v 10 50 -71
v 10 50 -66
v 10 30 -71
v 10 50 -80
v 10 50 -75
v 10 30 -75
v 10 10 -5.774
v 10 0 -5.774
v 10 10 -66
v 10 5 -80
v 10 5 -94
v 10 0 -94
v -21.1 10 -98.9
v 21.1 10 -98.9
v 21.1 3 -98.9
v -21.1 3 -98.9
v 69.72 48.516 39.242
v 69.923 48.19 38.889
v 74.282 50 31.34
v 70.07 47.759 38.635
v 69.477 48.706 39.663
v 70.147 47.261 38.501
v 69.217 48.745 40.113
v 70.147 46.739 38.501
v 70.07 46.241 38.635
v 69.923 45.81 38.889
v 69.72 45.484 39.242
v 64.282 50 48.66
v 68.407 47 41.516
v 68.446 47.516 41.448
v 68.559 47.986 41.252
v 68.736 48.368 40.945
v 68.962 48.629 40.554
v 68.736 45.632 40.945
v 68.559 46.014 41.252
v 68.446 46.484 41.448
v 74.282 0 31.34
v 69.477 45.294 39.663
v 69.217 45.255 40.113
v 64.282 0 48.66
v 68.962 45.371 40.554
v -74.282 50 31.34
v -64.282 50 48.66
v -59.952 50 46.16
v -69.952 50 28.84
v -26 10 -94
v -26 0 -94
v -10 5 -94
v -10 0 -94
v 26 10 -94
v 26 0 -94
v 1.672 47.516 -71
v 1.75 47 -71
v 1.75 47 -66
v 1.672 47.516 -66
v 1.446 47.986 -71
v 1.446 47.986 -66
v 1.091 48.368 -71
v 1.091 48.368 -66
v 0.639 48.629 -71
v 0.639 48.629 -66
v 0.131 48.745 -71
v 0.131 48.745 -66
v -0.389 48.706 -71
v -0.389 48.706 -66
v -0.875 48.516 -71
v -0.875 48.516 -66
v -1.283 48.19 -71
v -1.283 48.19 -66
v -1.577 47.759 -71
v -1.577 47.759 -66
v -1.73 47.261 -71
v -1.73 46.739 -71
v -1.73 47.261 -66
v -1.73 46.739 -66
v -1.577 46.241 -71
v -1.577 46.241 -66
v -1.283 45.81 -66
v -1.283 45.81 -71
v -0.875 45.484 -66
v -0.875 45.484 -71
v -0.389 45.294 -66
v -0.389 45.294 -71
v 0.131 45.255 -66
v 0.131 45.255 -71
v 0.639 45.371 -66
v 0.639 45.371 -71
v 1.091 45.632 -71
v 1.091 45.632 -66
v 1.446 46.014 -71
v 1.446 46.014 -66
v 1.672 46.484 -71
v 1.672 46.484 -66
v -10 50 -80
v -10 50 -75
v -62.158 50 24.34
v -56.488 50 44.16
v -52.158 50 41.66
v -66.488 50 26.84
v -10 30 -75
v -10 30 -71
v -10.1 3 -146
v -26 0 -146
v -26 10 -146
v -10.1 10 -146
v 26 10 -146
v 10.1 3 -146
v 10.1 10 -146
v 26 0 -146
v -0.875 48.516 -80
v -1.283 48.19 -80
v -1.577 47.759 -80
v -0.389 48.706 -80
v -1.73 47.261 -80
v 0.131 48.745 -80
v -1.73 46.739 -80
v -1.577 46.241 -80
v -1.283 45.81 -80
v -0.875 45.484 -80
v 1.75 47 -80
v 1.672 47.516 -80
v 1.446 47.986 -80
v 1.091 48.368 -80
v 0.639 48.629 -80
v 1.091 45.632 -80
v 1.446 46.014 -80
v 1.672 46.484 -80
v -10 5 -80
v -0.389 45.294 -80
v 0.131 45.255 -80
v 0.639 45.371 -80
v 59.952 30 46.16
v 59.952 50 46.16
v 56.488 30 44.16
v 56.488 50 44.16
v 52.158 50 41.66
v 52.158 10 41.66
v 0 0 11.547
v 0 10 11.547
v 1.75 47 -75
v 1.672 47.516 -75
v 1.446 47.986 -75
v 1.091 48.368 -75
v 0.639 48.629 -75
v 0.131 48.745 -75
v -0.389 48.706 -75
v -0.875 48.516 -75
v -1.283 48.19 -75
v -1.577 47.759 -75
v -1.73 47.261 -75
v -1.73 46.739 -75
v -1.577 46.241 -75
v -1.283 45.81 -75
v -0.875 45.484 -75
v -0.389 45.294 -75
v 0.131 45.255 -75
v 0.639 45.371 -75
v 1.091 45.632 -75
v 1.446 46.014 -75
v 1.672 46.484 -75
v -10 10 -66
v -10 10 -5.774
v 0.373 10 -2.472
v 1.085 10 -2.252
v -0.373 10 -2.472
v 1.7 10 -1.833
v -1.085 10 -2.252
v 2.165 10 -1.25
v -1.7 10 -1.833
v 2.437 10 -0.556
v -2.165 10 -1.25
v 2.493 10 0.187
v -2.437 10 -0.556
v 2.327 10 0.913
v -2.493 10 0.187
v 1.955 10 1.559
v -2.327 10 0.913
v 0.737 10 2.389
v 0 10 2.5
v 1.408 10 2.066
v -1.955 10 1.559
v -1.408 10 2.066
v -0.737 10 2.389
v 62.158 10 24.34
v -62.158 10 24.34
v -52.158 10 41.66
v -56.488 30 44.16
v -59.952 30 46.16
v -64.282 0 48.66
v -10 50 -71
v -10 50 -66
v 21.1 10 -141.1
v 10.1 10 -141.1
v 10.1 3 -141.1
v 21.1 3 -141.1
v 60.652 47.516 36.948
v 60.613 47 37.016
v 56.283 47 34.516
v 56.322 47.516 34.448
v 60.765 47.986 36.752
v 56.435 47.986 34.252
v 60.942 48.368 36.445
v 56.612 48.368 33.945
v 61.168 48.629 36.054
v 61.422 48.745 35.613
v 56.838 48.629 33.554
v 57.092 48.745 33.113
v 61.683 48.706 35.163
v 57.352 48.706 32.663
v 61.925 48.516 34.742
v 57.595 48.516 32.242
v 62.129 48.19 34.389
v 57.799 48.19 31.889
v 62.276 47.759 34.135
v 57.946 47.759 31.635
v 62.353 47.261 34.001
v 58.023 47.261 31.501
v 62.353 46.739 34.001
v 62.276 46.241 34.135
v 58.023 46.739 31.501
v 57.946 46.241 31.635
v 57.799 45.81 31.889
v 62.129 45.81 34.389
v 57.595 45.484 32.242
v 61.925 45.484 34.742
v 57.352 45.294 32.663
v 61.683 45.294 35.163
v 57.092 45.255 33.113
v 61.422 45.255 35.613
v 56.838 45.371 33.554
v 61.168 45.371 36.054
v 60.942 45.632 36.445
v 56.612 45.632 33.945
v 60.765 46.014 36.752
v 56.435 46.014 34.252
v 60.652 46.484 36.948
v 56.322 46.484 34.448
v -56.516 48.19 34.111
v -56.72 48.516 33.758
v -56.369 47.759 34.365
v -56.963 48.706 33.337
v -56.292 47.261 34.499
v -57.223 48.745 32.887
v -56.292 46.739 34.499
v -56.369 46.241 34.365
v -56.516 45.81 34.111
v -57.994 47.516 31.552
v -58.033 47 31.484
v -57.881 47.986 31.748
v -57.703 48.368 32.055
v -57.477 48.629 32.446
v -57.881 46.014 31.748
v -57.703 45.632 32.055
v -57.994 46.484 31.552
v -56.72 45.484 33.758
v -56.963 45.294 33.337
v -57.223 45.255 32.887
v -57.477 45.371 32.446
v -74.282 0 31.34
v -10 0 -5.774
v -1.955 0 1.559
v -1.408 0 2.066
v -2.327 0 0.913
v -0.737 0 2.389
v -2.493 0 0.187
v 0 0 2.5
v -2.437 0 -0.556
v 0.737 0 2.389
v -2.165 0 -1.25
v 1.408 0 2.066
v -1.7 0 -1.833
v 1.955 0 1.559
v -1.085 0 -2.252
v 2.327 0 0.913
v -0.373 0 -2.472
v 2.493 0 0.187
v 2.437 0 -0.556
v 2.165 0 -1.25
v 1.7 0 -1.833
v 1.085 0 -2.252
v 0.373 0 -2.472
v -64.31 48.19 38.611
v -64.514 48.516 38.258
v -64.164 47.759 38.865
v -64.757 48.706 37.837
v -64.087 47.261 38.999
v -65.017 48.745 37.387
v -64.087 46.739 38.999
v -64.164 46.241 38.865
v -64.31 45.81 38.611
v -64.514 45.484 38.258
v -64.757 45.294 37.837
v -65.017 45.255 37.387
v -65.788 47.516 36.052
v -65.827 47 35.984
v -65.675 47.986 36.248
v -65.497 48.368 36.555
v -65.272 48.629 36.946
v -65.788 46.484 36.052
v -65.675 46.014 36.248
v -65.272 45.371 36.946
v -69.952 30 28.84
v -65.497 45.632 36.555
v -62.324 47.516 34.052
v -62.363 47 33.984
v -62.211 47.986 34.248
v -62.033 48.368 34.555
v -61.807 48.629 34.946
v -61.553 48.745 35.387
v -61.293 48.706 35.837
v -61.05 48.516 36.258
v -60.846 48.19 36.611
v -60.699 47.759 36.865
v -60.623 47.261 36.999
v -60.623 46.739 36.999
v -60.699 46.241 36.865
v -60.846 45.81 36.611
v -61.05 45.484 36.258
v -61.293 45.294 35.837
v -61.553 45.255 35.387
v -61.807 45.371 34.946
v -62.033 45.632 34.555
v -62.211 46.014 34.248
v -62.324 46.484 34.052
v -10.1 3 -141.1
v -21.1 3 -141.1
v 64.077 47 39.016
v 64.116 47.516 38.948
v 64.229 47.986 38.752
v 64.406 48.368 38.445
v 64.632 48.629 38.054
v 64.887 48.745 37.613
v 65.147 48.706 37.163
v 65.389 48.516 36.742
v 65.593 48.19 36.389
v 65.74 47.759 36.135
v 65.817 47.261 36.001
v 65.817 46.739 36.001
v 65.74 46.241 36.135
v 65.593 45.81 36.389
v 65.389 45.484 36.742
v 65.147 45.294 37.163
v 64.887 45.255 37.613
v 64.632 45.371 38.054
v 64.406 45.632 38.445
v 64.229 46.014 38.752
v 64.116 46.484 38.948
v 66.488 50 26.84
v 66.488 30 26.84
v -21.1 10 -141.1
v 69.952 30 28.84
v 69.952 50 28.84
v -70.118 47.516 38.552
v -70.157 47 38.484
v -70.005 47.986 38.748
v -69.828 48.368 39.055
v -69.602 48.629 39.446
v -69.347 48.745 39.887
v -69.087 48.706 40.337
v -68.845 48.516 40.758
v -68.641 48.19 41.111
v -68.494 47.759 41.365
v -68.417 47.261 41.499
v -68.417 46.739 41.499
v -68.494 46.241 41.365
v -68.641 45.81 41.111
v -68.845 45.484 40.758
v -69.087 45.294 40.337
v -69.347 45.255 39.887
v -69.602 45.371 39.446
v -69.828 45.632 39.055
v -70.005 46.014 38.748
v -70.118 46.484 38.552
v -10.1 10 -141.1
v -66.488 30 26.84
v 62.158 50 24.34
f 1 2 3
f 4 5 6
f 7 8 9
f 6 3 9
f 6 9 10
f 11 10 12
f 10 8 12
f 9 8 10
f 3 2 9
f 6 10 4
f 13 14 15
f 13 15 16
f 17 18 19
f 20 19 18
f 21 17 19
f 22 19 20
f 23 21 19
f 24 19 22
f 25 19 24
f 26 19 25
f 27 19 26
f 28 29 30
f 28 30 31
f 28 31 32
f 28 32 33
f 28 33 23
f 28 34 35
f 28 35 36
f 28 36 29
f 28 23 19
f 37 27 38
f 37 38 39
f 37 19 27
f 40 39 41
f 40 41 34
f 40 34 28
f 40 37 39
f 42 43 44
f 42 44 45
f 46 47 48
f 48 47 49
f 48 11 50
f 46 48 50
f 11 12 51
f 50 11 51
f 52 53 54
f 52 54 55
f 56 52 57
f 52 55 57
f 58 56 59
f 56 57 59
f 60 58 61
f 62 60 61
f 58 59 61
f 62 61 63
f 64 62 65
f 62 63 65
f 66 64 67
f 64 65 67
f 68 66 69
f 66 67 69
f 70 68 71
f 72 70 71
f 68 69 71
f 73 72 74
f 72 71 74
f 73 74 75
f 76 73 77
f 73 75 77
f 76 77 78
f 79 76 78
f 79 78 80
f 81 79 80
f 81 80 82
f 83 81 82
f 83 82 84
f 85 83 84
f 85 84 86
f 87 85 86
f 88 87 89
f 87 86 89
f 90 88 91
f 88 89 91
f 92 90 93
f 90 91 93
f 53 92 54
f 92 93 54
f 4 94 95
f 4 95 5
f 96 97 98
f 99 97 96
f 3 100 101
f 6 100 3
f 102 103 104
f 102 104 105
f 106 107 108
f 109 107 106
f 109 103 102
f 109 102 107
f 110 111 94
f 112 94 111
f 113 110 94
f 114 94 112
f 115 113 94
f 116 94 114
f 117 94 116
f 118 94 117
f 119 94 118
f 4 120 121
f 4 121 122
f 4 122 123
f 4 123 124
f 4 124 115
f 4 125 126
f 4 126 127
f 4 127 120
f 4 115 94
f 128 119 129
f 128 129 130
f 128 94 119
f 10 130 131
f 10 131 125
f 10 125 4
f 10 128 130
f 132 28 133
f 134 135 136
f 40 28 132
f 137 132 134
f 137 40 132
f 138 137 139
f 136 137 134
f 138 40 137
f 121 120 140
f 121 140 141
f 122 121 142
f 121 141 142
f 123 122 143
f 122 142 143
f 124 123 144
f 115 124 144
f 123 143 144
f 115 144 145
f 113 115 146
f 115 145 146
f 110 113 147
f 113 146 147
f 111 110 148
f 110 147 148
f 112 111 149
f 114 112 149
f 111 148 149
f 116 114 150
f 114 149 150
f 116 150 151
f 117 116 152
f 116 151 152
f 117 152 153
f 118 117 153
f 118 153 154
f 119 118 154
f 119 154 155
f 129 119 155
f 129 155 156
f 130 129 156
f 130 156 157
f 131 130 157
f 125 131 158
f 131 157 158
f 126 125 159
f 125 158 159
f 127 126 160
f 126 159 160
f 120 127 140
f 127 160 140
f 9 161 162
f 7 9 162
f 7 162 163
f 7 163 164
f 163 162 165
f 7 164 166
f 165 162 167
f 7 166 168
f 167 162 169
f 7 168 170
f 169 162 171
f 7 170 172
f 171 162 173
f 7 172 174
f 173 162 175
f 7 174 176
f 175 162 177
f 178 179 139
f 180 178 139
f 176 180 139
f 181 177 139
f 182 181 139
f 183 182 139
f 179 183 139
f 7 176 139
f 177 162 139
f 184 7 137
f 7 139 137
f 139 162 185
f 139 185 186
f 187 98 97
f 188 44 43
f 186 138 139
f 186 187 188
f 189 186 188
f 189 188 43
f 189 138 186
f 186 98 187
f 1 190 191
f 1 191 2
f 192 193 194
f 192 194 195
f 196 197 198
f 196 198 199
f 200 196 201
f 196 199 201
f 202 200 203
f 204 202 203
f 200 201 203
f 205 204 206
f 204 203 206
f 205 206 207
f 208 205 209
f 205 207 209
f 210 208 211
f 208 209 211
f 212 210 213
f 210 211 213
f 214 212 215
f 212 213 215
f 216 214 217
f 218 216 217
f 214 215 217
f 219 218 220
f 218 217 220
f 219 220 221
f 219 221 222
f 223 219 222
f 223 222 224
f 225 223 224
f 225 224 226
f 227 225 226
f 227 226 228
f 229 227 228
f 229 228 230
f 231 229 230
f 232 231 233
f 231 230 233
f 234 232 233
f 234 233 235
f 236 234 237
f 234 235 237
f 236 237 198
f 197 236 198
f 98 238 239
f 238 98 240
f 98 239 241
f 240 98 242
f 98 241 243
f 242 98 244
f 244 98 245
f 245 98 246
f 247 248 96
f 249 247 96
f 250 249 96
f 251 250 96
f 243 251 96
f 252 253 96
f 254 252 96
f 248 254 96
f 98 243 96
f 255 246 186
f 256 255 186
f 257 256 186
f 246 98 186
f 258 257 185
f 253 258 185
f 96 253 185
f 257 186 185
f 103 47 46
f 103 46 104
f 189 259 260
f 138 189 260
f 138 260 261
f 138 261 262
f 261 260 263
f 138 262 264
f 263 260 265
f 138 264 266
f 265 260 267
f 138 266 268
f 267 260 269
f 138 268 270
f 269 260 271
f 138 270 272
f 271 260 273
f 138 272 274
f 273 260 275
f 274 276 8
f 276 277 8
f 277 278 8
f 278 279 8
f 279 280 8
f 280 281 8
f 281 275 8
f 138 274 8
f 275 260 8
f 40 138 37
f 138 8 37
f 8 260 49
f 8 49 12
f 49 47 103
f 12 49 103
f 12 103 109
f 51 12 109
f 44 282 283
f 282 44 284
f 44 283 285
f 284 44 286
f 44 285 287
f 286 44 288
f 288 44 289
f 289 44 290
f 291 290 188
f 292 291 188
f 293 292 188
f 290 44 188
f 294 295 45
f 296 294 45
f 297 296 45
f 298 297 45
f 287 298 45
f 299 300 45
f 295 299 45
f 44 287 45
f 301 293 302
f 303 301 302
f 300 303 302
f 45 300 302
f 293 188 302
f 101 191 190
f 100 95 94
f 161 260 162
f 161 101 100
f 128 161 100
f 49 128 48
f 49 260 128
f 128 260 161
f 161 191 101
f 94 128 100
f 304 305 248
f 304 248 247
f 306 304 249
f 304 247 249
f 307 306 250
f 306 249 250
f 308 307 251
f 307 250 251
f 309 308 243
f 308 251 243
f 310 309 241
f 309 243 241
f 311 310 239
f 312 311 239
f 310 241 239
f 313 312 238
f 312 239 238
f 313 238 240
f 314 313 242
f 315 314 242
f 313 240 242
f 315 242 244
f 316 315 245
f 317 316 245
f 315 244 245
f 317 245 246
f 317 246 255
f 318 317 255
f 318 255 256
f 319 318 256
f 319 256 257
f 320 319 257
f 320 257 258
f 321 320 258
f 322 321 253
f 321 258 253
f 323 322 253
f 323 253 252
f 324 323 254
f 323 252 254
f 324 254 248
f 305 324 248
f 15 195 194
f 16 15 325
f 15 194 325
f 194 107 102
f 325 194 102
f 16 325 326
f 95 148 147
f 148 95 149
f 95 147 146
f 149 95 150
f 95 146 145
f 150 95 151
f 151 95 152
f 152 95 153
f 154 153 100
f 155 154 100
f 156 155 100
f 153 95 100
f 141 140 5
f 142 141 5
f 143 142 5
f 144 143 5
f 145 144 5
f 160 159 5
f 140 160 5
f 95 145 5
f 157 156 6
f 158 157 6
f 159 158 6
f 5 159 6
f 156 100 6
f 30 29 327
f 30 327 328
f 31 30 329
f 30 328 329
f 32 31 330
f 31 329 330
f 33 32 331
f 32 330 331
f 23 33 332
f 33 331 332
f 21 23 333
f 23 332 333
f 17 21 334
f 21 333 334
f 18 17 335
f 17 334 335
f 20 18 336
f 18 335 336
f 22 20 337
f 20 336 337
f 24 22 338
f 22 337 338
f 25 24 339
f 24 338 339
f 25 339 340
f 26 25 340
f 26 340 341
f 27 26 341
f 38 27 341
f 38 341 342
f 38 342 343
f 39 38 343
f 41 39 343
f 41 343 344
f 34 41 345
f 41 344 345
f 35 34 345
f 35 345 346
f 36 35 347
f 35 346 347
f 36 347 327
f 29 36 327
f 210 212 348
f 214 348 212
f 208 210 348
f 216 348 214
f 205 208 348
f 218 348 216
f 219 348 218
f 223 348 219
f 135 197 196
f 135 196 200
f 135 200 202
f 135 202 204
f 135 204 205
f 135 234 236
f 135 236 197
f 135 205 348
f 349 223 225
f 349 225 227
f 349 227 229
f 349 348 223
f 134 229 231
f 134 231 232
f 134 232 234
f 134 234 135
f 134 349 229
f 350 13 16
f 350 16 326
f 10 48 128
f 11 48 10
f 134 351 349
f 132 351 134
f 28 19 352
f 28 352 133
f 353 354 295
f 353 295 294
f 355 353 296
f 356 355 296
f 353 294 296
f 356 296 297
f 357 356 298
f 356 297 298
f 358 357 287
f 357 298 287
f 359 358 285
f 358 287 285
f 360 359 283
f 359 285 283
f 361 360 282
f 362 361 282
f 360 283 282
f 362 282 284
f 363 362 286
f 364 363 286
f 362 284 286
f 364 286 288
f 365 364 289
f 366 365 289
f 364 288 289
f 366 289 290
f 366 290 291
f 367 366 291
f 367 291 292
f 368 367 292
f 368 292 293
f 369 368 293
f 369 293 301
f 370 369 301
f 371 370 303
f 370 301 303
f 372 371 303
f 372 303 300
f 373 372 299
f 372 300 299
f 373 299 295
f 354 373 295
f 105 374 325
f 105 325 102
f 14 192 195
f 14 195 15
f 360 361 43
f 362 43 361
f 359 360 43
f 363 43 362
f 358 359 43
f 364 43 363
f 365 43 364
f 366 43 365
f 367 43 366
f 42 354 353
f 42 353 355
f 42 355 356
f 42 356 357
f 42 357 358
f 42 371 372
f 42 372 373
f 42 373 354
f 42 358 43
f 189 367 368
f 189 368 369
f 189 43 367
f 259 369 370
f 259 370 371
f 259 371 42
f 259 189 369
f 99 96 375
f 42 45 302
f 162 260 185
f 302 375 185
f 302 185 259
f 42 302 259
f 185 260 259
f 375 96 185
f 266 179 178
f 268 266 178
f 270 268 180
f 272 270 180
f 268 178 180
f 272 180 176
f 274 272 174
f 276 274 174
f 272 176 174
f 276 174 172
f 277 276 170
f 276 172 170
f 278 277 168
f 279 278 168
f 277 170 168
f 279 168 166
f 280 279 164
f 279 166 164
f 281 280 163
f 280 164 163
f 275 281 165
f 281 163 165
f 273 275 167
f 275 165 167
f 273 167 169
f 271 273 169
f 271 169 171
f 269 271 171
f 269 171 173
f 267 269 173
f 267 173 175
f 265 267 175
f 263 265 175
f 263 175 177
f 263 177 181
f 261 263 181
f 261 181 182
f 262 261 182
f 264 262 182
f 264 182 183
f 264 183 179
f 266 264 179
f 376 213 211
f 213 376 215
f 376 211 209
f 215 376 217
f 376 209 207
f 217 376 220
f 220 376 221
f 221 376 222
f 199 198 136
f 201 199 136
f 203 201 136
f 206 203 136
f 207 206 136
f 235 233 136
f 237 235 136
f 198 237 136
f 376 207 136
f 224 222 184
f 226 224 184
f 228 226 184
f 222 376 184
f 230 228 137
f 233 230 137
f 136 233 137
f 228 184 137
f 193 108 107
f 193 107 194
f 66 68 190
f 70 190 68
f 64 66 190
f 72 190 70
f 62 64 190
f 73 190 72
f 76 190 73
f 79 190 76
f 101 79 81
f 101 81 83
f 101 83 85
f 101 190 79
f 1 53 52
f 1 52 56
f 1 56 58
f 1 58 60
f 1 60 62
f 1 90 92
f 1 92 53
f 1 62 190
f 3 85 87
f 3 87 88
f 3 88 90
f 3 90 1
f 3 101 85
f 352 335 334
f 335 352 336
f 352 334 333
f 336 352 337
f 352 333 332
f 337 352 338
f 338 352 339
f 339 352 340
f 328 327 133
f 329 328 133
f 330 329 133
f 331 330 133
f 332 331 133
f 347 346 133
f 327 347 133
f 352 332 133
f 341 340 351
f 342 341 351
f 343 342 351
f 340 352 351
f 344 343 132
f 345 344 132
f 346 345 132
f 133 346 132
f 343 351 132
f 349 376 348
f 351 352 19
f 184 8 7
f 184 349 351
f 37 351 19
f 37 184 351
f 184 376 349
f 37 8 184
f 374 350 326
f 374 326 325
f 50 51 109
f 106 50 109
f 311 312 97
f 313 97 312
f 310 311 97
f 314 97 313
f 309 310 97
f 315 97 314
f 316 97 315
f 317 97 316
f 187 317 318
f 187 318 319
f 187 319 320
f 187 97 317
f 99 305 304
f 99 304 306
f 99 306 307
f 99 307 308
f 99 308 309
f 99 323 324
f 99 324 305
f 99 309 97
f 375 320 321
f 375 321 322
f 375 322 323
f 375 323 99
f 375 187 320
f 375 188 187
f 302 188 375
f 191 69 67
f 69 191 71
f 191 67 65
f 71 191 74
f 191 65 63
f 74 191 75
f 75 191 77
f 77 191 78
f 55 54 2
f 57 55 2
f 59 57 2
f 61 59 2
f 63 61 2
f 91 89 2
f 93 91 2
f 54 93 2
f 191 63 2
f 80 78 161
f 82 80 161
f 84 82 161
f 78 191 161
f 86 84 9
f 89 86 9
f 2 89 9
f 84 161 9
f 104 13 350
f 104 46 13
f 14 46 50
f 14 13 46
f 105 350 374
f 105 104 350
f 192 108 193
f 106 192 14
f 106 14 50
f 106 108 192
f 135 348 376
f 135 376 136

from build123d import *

# Parameters (mm, degrees)
BOSS_EXTRUDE1_DEPTH = 10
SKETCH2_W           = 20
SKETCH2_H           = 14
BOSS_EXTRUDE2_DEPTH = 20
SKETCH3_W           = 20
SKETCH3_H           = 5
BOSS_EXTRUDE3_DEPTH = 20
SKETCH4_R           = 1.75
CUT_EXTRUDE1_DEPTH  = 84.402637848
CIRPATTERN1_COUNT   = 3
SKETCH5_R           = 2.5
CUT_EXTRUDE2_DEPTH  = 117.266161556
SKETCH8_W           = 20
SKETCH8_H           = 14
BOSS_EXTRUDE7_DEPTH = 5
SKETCH11_W          = 52
SKETCH11_H          = 52
BOSS_EXTRUDE8_DEPTH = 10
CUT_EXTRUDE3_DEPTH  = 7


with BuildPart() as part:
    # Sketch1 → Boss-Extrude1 (new body)
    with BuildSketch(Plane(origin=(0, 0, 0), x_dir=(1, 0, 0), z_dir=(0, 1, 0))):
        Polygon((0, 0), (-10, 5.773502692), (-10, 80), (10, 80), (10, 5.773502692), align=None)
    boss_extrude1 = extrude(amount=BOSS_EXTRUDE1_DEPTH)

    # Sketch2 → Boss-Extrude2 (add)
    with BuildSketch(Plane(origin=(0, 10, 0), x_dir=(1, 0, 0), z_dir=(0, 1, 0))):
        with Locations((0, 73)):
            Rectangle(SKETCH2_W, SKETCH2_H)
    boss_extrude2 = extrude(amount=BOSS_EXTRUDE2_DEPTH)

    # Sketch3 → Boss-Extrude3 (add)
    with BuildSketch(Plane(origin=(0, 30, 0), x_dir=(1, 0, 0), z_dir=(0, 1, 0))):
        with Locations((0, 77.5)):
            Rectangle(SKETCH3_W, SKETCH3_H)
        with Locations((0, 68.5)):
            Rectangle(SKETCH3_W, SKETCH3_H)
    boss_extrude3 = extrude(amount=BOSS_EXTRUDE3_DEPTH)

    # Sketch4 → Cut-Extrude1 (cut, symmetric)
    with BuildSketch(Plane.XY.offset(-66)):
        with Locations((0, 47)):
            Circle(SKETCH4_R)
    cut_extrude1 = extrude(amount=CUT_EXTRUDE1_DEPTH, both=True, mode=Mode.SUBTRACT)

    # CirPattern1: Boss-Extrude1, Boss-Extrude2, Boss-Extrude3, Cut-Extrude1 ×3 about axis
    cirpattern1_axis = Axis((0, 0, 0), (0, 1, 0))
    add([boss_extrude1.rotate(cirpattern1_axis, i * 360 / CIRPATTERN1_COUNT) for i in range(1, CIRPATTERN1_COUNT)])
    add([boss_extrude2.rotate(cirpattern1_axis, i * 360 / CIRPATTERN1_COUNT) for i in range(1, CIRPATTERN1_COUNT)])
    add([boss_extrude3.rotate(cirpattern1_axis, i * 360 / CIRPATTERN1_COUNT) for i in range(1, CIRPATTERN1_COUNT)])
    add([cut_extrude1.rotate(cirpattern1_axis, i * 360 / CIRPATTERN1_COUNT) for i in range(1, CIRPATTERN1_COUNT)], mode=Mode.SUBTRACT)

    # Sketch5 → Cut-Extrude2 (cut, through all)
    with BuildSketch(Plane(origin=(0, 10, 0), x_dir=(1, 0, 0), z_dir=(0, 1, 0))):
        with Locations(Location((0, 0, 0), (0, 0, 270))):
            Circle(SKETCH5_R)
    extrude(amount=-CUT_EXTRUDE2_DEPTH, mode=Mode.SUBTRACT)

    # Sketch8 → Boss-Extrude7 (add)
    with BuildSketch(Plane(origin=(0, 0, 0), x_dir=(1, 0, 0), z_dir=(0, 1, 0))):
        with Locations((0, 87)):
            Rectangle(SKETCH8_W, SKETCH8_H)
    extrude(amount=BOSS_EXTRUDE7_DEPTH)

    # Sketch11 → Boss-Extrude8 (add)
    with BuildSketch(Plane(origin=(0, 0, 0), x_dir=(1, 0, 0), z_dir=(0, 1, 0))):
        with Locations((0, 120)):
            Rectangle(SKETCH11_W, SKETCH11_H)
    extrude(amount=BOSS_EXTRUDE8_DEPTH)

    # Sketch12 → Cut-Extrude3 (cut)
    with BuildSketch(Plane(origin=(0, 10, 0), x_dir=(1, 0, 0), z_dir=(0, 1, 0))):
        Polygon((-21.1, 141.1), (-10.1, 141.1), (-10.1, 146), (10.1, 146), (10.1, 141.1), (21.1, 141.1), (21.1, 98.9), (-21.1, 98.9), align=None)
    extrude(amount=-CUT_EXTRUDE3_DEPTH, mode=Mode.SUBTRACT)


solid = part.part
